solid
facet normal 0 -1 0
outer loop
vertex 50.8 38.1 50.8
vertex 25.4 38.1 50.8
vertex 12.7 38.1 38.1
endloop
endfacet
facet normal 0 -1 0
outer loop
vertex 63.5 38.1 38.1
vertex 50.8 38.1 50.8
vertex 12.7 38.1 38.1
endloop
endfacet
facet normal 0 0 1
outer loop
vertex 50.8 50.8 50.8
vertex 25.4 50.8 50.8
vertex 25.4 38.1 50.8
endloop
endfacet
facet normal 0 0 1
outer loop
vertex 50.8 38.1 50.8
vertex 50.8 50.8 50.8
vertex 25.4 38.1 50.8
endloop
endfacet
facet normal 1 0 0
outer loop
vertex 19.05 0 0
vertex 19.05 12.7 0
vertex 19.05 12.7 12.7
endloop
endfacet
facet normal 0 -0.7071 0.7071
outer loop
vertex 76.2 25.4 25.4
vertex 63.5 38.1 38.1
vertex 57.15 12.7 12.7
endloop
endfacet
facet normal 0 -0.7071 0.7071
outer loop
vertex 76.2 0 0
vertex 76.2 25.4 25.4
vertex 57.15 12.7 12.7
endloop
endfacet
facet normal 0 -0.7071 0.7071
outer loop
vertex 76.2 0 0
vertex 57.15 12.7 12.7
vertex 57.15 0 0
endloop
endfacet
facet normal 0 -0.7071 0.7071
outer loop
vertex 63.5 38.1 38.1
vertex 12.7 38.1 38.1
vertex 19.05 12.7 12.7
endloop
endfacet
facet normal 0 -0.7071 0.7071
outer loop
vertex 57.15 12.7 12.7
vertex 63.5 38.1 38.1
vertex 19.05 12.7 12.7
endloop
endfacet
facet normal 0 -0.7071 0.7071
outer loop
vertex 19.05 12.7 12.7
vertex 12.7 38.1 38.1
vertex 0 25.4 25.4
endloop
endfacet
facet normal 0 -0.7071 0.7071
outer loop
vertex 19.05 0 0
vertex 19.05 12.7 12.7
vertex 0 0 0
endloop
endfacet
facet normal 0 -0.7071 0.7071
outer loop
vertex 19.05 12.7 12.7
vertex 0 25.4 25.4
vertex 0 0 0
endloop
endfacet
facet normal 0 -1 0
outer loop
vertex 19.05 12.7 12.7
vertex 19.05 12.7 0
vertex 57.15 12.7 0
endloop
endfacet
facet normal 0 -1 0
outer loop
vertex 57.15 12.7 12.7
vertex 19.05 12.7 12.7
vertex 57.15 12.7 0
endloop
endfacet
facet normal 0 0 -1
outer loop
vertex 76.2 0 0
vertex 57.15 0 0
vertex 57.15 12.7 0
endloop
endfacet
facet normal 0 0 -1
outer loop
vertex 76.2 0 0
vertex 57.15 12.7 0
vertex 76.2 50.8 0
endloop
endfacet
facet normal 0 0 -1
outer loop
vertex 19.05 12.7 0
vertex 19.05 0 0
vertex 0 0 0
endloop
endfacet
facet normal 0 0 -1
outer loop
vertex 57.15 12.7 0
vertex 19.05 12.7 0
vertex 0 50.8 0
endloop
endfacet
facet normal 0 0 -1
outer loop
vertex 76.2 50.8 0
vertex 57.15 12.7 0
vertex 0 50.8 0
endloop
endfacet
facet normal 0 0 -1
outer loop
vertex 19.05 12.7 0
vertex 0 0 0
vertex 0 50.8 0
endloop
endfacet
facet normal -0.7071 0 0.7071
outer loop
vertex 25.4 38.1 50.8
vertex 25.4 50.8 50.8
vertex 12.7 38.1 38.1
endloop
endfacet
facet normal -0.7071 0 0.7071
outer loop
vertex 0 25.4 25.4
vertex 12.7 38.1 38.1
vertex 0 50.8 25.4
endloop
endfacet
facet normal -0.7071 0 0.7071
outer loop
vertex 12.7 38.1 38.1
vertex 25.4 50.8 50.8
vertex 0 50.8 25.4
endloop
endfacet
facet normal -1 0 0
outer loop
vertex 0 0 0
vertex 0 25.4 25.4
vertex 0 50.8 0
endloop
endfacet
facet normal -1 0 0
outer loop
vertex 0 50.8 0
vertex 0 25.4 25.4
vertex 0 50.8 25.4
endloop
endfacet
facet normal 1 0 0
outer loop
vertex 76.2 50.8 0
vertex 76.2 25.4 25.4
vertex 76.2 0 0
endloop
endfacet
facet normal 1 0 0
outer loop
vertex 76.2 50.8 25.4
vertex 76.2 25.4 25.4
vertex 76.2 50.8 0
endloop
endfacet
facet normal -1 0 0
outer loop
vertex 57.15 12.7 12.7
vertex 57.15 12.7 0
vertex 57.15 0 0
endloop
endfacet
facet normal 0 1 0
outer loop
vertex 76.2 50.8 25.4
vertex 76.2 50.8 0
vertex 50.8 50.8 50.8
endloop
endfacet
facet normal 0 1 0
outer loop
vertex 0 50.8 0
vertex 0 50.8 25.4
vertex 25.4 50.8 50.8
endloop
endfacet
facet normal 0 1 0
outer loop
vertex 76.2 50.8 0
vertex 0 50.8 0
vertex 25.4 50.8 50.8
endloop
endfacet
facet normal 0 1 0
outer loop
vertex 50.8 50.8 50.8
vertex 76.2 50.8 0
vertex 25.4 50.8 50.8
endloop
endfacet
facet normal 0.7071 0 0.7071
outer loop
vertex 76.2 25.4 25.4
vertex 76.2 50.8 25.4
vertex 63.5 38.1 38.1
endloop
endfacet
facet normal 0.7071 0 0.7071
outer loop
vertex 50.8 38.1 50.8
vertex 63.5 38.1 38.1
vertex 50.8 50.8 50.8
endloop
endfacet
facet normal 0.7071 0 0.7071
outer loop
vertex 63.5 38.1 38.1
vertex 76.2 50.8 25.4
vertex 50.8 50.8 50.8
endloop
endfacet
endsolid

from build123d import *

# Parameters (mm, degrees)
F0_W     = 12.7
F0_H     = 25.4
F1_DEPTH = 76.2
F2_W     = 38.1
F2_H     = 12.7
F3_DEPTH = 50.801
F5_DEPTH = 50.801


with BuildPart() as f1:
    # F0 (on Right) → F1 (new body)
    with BuildSketch(Plane.YZ):
        Polygon((38.1, 38.1), (0, 0), (38.1, 0), (38.1, 25.4), align=None)
        with Locations((44.45, 12.7)):
            Rectangle(F0_W, F0_H)
        Polygon((38.1, 50.8), (38.1, 38.1), (38.1, 25.4), (50.8, 25.4), (50.8, 50.8), align=None)
    extrude(amount=F1_DEPTH)

    # F2 (on face) → F3 (cut, through all)
    with BuildSketch(Plane(origin=(0, 0, 0), x_dir=(1, 0, 0), z_dir=(0, 0, -1))):
        with Locations((38.1, -6.35)):
            Rectangle(F2_W, F2_H)
    extrude(amount=-F3_DEPTH, mode=Mode.SUBTRACT)

    # F4 (on face) → F5 (cut, through all)
    with BuildSketch(Plane(origin=(0, 50.8, 0), x_dir=(-1, 0, 0), z_dir=(0, 1, 0))):
        Polygon((-76.2, 38.1), (-63.5, 38.1), (-50.8, 50.8), (-76.2, 50.8), align=None)
        Polygon((-25.4, 50.8), (-12.7, 38.1), (0, 38.1), (0, 50.8), align=None)
        Polygon((0, 38.1), (-12.7, 38.1), (0, 25.4), align=None)
        Polygon((-76.2, 25.4), (-63.5, 38.1), (-76.2, 38.1), align=None)
    extrude(amount=-F5_DEPTH, mode=Mode.SUBTRACT)


solid = f1.part
